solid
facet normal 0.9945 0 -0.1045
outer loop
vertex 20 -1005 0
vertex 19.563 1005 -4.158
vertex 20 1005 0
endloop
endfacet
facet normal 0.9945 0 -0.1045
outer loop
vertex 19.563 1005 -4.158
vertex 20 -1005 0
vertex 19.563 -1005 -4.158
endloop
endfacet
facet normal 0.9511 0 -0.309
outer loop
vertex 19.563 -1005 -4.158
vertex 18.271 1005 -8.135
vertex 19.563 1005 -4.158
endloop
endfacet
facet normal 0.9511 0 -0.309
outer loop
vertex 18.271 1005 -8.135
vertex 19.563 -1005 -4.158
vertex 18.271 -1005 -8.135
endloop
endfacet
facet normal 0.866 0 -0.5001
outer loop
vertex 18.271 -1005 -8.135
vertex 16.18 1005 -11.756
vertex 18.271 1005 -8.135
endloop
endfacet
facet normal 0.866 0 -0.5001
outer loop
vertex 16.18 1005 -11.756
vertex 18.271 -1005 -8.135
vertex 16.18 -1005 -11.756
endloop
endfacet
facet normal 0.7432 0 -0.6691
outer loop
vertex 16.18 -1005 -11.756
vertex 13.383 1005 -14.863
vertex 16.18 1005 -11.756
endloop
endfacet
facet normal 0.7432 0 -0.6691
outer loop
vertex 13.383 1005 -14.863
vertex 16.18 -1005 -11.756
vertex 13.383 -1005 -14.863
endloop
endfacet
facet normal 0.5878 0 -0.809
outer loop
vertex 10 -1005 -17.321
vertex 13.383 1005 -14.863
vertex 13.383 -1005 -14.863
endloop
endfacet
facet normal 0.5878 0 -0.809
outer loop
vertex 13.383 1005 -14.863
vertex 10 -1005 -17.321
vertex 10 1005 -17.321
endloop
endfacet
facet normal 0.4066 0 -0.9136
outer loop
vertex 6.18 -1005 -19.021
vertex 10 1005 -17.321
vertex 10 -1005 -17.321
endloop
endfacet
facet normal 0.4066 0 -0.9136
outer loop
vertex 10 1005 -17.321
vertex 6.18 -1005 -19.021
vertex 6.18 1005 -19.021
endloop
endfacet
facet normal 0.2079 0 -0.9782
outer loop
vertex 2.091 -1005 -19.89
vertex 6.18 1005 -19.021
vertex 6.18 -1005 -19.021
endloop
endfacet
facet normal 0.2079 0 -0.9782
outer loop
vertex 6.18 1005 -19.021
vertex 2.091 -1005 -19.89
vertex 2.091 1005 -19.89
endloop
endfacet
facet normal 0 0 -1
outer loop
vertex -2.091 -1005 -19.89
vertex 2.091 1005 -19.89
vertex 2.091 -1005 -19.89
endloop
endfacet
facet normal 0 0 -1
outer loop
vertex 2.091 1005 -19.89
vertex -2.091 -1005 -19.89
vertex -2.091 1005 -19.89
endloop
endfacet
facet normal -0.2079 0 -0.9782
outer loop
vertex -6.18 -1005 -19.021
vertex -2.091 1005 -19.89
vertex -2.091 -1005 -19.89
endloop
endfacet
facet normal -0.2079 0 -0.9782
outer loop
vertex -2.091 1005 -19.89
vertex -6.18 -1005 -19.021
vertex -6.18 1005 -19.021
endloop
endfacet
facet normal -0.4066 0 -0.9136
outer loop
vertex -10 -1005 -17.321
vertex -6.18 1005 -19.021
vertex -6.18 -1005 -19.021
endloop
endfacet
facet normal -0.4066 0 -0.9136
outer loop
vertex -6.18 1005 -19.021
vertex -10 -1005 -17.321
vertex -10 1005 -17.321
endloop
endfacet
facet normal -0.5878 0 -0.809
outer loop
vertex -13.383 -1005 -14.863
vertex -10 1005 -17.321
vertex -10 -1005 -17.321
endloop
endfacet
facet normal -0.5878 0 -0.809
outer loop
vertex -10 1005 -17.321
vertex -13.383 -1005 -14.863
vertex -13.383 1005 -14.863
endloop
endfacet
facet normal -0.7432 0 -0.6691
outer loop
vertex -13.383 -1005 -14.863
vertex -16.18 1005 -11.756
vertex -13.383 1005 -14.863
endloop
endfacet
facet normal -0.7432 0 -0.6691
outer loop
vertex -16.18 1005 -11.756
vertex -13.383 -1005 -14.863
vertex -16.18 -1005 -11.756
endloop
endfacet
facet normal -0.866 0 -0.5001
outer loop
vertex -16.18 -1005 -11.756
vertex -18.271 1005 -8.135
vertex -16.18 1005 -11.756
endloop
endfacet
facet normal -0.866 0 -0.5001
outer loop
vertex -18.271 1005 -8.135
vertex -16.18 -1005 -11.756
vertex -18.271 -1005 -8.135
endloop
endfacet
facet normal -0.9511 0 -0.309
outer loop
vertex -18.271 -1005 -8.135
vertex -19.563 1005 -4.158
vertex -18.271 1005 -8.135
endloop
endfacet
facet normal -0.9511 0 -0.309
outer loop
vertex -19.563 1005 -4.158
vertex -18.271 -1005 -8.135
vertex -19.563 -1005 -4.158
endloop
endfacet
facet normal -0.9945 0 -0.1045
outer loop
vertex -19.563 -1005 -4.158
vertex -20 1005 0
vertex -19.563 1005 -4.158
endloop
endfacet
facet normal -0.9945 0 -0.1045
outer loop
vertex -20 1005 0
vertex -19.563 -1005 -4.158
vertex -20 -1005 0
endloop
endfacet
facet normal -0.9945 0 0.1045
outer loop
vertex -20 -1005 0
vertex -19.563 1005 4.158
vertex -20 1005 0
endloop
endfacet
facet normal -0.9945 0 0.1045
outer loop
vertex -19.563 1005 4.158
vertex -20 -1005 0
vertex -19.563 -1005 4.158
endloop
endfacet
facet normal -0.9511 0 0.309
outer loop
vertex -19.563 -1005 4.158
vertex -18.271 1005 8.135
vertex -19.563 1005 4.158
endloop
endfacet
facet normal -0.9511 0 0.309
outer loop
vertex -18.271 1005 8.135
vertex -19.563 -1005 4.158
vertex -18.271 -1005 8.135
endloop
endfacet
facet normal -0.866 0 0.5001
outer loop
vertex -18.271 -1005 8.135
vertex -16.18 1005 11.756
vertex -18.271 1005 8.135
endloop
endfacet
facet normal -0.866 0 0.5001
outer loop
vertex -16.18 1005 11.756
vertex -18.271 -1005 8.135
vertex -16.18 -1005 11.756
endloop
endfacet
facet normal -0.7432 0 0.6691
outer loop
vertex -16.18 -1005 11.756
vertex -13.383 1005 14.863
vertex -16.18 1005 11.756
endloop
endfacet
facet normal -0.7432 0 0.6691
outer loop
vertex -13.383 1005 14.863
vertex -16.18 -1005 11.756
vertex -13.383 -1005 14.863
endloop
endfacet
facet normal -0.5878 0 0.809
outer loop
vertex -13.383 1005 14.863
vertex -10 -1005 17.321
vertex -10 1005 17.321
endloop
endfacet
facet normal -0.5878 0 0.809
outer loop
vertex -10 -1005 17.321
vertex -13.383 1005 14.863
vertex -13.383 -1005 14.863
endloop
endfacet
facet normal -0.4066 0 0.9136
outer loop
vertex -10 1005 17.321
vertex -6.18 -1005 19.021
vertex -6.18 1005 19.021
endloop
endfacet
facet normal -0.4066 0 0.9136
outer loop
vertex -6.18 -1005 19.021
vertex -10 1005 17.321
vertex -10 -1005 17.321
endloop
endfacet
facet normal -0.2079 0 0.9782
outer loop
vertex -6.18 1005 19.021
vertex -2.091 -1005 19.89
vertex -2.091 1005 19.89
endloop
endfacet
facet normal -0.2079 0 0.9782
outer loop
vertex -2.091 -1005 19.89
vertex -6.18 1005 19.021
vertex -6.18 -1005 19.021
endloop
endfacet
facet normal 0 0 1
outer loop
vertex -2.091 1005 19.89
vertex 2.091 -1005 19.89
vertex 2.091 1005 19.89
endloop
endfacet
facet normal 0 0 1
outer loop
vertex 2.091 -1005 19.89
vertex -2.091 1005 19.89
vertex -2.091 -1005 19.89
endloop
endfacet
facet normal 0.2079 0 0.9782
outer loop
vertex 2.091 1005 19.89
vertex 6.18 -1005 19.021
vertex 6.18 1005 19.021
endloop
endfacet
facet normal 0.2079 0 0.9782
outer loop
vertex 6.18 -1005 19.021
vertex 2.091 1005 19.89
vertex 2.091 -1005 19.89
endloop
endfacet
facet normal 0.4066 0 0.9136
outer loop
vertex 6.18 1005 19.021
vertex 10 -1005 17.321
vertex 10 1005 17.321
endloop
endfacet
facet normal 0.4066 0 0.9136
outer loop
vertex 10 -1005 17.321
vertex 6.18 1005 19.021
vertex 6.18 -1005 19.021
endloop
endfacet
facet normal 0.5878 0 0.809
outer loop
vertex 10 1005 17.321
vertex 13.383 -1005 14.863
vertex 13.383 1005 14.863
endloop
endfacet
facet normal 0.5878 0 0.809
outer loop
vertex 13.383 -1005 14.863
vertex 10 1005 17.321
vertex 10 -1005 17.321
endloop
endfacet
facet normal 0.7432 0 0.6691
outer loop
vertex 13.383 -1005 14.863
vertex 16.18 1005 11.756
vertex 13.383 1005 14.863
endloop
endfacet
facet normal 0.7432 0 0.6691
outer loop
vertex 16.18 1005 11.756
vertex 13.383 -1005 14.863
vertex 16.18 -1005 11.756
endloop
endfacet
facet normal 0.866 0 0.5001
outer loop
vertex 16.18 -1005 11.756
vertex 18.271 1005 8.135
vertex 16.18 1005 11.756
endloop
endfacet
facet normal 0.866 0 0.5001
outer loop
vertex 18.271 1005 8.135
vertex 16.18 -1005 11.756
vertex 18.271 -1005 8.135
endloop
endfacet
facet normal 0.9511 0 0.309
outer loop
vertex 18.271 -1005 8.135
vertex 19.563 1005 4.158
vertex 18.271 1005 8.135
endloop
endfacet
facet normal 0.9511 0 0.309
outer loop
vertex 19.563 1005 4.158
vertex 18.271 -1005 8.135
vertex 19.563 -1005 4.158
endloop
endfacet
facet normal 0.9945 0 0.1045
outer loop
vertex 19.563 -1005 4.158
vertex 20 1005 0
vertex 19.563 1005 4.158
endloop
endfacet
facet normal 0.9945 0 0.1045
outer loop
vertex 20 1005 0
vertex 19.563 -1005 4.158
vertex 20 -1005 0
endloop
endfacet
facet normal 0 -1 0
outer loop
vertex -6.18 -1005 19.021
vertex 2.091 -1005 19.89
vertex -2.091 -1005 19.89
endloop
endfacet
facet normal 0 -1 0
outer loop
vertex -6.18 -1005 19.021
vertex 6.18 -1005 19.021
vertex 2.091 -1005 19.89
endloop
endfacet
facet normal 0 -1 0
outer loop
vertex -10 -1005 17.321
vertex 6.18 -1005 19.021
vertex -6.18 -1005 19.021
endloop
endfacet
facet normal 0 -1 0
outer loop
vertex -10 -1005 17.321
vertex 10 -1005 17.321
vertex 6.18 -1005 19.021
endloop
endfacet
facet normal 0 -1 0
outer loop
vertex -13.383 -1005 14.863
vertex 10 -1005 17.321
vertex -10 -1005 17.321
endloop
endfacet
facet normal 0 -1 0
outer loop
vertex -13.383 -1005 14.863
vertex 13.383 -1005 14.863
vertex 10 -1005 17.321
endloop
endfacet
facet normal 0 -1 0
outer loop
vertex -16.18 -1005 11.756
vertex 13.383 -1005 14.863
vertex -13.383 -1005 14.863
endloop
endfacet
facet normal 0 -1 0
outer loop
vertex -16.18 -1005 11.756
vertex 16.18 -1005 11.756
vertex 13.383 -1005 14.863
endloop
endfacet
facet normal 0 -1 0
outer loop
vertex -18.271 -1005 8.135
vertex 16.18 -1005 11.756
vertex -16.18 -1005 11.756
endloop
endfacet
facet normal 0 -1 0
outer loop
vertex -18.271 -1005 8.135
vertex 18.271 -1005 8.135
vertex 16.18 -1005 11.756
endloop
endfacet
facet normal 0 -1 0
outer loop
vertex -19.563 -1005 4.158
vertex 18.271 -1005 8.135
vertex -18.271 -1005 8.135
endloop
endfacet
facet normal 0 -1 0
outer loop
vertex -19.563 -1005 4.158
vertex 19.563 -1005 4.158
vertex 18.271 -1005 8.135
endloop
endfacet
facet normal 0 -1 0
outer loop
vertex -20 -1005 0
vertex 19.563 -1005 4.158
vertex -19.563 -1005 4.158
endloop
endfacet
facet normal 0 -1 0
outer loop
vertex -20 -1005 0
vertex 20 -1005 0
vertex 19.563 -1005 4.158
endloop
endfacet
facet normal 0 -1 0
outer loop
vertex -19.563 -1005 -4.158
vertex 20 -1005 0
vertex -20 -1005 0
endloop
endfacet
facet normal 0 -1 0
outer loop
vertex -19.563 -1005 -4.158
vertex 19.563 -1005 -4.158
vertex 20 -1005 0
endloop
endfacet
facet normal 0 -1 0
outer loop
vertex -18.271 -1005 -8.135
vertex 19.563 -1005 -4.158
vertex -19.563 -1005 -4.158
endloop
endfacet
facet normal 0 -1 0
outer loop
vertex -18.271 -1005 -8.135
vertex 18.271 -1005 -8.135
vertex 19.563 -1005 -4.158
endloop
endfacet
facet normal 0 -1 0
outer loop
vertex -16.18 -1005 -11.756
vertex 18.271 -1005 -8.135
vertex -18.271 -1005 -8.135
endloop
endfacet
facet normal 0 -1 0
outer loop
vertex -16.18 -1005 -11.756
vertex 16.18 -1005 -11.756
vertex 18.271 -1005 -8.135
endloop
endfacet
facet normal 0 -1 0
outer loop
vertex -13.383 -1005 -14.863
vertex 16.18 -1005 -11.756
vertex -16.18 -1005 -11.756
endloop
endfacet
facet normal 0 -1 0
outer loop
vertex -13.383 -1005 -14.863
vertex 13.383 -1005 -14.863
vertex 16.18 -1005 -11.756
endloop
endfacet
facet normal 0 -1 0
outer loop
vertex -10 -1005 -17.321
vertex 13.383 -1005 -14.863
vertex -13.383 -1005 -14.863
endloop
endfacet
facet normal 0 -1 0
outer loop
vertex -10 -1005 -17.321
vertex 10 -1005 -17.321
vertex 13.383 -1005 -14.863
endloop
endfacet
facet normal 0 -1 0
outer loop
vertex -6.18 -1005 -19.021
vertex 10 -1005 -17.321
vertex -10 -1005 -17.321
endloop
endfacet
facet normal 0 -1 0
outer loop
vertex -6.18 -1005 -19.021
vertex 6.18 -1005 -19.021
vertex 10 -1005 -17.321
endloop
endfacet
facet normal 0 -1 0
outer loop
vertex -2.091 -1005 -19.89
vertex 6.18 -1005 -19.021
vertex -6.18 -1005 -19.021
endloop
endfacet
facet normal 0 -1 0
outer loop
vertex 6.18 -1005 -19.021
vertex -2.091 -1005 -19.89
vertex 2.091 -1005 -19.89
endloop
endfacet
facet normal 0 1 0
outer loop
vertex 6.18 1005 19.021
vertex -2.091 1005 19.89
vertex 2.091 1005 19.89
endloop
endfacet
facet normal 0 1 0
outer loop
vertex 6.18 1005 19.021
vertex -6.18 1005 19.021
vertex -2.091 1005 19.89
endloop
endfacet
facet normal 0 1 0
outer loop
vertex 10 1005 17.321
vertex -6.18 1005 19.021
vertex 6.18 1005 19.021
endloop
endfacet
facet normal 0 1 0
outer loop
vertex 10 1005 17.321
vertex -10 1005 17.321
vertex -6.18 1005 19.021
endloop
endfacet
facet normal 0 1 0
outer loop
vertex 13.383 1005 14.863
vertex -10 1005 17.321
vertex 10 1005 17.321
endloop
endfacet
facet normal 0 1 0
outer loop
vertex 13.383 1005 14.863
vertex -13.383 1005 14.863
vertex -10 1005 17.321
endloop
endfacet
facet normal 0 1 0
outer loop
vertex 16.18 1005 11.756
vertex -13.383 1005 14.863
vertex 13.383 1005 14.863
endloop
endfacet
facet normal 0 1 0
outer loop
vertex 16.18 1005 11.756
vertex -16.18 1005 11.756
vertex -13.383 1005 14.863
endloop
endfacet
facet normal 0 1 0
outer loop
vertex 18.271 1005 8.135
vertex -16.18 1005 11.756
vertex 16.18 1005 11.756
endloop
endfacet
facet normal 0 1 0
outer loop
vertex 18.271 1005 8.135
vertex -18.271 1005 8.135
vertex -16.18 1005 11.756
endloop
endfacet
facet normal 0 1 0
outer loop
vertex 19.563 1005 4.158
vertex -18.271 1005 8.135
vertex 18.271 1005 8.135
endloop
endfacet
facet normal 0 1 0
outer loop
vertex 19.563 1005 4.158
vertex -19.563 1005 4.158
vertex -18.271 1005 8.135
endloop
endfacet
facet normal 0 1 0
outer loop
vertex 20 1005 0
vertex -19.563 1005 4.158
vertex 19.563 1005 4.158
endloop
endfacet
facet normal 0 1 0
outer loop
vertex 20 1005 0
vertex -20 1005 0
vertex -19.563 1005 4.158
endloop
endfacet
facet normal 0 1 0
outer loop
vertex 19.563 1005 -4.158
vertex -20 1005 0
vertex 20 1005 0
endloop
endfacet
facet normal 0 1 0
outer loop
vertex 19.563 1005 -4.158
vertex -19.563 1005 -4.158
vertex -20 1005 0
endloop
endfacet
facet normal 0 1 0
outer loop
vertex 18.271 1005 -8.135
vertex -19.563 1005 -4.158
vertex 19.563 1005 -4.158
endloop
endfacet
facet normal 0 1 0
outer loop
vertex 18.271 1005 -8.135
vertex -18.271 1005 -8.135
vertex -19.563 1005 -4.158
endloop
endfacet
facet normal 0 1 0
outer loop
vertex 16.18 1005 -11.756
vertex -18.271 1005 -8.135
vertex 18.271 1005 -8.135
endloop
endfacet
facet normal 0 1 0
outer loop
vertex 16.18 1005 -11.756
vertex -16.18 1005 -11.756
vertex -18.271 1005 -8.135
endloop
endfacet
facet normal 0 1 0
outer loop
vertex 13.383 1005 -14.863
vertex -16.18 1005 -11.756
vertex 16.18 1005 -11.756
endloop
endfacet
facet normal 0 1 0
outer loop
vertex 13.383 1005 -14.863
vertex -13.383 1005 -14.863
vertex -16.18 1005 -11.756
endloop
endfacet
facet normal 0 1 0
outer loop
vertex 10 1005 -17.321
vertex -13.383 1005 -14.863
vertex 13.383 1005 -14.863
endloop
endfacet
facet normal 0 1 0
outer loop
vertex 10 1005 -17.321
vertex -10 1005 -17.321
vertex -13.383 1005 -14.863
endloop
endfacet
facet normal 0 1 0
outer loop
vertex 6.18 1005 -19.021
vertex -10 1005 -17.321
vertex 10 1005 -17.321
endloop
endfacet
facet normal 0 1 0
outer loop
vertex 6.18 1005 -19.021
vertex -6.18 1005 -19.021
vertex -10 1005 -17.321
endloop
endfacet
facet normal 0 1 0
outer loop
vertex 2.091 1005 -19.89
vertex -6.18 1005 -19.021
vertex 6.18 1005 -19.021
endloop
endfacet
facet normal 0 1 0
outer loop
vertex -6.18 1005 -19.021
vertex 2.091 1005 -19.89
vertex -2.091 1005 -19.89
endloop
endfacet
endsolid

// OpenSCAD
diamVnesh=40;
lenTotal=2010;    


module Balka25Min() {

    rotate([-90,0,0]) 
    cylinder(h=lenTotal, r=diamVnesh/2, center=true);

}

Balka25Min();
